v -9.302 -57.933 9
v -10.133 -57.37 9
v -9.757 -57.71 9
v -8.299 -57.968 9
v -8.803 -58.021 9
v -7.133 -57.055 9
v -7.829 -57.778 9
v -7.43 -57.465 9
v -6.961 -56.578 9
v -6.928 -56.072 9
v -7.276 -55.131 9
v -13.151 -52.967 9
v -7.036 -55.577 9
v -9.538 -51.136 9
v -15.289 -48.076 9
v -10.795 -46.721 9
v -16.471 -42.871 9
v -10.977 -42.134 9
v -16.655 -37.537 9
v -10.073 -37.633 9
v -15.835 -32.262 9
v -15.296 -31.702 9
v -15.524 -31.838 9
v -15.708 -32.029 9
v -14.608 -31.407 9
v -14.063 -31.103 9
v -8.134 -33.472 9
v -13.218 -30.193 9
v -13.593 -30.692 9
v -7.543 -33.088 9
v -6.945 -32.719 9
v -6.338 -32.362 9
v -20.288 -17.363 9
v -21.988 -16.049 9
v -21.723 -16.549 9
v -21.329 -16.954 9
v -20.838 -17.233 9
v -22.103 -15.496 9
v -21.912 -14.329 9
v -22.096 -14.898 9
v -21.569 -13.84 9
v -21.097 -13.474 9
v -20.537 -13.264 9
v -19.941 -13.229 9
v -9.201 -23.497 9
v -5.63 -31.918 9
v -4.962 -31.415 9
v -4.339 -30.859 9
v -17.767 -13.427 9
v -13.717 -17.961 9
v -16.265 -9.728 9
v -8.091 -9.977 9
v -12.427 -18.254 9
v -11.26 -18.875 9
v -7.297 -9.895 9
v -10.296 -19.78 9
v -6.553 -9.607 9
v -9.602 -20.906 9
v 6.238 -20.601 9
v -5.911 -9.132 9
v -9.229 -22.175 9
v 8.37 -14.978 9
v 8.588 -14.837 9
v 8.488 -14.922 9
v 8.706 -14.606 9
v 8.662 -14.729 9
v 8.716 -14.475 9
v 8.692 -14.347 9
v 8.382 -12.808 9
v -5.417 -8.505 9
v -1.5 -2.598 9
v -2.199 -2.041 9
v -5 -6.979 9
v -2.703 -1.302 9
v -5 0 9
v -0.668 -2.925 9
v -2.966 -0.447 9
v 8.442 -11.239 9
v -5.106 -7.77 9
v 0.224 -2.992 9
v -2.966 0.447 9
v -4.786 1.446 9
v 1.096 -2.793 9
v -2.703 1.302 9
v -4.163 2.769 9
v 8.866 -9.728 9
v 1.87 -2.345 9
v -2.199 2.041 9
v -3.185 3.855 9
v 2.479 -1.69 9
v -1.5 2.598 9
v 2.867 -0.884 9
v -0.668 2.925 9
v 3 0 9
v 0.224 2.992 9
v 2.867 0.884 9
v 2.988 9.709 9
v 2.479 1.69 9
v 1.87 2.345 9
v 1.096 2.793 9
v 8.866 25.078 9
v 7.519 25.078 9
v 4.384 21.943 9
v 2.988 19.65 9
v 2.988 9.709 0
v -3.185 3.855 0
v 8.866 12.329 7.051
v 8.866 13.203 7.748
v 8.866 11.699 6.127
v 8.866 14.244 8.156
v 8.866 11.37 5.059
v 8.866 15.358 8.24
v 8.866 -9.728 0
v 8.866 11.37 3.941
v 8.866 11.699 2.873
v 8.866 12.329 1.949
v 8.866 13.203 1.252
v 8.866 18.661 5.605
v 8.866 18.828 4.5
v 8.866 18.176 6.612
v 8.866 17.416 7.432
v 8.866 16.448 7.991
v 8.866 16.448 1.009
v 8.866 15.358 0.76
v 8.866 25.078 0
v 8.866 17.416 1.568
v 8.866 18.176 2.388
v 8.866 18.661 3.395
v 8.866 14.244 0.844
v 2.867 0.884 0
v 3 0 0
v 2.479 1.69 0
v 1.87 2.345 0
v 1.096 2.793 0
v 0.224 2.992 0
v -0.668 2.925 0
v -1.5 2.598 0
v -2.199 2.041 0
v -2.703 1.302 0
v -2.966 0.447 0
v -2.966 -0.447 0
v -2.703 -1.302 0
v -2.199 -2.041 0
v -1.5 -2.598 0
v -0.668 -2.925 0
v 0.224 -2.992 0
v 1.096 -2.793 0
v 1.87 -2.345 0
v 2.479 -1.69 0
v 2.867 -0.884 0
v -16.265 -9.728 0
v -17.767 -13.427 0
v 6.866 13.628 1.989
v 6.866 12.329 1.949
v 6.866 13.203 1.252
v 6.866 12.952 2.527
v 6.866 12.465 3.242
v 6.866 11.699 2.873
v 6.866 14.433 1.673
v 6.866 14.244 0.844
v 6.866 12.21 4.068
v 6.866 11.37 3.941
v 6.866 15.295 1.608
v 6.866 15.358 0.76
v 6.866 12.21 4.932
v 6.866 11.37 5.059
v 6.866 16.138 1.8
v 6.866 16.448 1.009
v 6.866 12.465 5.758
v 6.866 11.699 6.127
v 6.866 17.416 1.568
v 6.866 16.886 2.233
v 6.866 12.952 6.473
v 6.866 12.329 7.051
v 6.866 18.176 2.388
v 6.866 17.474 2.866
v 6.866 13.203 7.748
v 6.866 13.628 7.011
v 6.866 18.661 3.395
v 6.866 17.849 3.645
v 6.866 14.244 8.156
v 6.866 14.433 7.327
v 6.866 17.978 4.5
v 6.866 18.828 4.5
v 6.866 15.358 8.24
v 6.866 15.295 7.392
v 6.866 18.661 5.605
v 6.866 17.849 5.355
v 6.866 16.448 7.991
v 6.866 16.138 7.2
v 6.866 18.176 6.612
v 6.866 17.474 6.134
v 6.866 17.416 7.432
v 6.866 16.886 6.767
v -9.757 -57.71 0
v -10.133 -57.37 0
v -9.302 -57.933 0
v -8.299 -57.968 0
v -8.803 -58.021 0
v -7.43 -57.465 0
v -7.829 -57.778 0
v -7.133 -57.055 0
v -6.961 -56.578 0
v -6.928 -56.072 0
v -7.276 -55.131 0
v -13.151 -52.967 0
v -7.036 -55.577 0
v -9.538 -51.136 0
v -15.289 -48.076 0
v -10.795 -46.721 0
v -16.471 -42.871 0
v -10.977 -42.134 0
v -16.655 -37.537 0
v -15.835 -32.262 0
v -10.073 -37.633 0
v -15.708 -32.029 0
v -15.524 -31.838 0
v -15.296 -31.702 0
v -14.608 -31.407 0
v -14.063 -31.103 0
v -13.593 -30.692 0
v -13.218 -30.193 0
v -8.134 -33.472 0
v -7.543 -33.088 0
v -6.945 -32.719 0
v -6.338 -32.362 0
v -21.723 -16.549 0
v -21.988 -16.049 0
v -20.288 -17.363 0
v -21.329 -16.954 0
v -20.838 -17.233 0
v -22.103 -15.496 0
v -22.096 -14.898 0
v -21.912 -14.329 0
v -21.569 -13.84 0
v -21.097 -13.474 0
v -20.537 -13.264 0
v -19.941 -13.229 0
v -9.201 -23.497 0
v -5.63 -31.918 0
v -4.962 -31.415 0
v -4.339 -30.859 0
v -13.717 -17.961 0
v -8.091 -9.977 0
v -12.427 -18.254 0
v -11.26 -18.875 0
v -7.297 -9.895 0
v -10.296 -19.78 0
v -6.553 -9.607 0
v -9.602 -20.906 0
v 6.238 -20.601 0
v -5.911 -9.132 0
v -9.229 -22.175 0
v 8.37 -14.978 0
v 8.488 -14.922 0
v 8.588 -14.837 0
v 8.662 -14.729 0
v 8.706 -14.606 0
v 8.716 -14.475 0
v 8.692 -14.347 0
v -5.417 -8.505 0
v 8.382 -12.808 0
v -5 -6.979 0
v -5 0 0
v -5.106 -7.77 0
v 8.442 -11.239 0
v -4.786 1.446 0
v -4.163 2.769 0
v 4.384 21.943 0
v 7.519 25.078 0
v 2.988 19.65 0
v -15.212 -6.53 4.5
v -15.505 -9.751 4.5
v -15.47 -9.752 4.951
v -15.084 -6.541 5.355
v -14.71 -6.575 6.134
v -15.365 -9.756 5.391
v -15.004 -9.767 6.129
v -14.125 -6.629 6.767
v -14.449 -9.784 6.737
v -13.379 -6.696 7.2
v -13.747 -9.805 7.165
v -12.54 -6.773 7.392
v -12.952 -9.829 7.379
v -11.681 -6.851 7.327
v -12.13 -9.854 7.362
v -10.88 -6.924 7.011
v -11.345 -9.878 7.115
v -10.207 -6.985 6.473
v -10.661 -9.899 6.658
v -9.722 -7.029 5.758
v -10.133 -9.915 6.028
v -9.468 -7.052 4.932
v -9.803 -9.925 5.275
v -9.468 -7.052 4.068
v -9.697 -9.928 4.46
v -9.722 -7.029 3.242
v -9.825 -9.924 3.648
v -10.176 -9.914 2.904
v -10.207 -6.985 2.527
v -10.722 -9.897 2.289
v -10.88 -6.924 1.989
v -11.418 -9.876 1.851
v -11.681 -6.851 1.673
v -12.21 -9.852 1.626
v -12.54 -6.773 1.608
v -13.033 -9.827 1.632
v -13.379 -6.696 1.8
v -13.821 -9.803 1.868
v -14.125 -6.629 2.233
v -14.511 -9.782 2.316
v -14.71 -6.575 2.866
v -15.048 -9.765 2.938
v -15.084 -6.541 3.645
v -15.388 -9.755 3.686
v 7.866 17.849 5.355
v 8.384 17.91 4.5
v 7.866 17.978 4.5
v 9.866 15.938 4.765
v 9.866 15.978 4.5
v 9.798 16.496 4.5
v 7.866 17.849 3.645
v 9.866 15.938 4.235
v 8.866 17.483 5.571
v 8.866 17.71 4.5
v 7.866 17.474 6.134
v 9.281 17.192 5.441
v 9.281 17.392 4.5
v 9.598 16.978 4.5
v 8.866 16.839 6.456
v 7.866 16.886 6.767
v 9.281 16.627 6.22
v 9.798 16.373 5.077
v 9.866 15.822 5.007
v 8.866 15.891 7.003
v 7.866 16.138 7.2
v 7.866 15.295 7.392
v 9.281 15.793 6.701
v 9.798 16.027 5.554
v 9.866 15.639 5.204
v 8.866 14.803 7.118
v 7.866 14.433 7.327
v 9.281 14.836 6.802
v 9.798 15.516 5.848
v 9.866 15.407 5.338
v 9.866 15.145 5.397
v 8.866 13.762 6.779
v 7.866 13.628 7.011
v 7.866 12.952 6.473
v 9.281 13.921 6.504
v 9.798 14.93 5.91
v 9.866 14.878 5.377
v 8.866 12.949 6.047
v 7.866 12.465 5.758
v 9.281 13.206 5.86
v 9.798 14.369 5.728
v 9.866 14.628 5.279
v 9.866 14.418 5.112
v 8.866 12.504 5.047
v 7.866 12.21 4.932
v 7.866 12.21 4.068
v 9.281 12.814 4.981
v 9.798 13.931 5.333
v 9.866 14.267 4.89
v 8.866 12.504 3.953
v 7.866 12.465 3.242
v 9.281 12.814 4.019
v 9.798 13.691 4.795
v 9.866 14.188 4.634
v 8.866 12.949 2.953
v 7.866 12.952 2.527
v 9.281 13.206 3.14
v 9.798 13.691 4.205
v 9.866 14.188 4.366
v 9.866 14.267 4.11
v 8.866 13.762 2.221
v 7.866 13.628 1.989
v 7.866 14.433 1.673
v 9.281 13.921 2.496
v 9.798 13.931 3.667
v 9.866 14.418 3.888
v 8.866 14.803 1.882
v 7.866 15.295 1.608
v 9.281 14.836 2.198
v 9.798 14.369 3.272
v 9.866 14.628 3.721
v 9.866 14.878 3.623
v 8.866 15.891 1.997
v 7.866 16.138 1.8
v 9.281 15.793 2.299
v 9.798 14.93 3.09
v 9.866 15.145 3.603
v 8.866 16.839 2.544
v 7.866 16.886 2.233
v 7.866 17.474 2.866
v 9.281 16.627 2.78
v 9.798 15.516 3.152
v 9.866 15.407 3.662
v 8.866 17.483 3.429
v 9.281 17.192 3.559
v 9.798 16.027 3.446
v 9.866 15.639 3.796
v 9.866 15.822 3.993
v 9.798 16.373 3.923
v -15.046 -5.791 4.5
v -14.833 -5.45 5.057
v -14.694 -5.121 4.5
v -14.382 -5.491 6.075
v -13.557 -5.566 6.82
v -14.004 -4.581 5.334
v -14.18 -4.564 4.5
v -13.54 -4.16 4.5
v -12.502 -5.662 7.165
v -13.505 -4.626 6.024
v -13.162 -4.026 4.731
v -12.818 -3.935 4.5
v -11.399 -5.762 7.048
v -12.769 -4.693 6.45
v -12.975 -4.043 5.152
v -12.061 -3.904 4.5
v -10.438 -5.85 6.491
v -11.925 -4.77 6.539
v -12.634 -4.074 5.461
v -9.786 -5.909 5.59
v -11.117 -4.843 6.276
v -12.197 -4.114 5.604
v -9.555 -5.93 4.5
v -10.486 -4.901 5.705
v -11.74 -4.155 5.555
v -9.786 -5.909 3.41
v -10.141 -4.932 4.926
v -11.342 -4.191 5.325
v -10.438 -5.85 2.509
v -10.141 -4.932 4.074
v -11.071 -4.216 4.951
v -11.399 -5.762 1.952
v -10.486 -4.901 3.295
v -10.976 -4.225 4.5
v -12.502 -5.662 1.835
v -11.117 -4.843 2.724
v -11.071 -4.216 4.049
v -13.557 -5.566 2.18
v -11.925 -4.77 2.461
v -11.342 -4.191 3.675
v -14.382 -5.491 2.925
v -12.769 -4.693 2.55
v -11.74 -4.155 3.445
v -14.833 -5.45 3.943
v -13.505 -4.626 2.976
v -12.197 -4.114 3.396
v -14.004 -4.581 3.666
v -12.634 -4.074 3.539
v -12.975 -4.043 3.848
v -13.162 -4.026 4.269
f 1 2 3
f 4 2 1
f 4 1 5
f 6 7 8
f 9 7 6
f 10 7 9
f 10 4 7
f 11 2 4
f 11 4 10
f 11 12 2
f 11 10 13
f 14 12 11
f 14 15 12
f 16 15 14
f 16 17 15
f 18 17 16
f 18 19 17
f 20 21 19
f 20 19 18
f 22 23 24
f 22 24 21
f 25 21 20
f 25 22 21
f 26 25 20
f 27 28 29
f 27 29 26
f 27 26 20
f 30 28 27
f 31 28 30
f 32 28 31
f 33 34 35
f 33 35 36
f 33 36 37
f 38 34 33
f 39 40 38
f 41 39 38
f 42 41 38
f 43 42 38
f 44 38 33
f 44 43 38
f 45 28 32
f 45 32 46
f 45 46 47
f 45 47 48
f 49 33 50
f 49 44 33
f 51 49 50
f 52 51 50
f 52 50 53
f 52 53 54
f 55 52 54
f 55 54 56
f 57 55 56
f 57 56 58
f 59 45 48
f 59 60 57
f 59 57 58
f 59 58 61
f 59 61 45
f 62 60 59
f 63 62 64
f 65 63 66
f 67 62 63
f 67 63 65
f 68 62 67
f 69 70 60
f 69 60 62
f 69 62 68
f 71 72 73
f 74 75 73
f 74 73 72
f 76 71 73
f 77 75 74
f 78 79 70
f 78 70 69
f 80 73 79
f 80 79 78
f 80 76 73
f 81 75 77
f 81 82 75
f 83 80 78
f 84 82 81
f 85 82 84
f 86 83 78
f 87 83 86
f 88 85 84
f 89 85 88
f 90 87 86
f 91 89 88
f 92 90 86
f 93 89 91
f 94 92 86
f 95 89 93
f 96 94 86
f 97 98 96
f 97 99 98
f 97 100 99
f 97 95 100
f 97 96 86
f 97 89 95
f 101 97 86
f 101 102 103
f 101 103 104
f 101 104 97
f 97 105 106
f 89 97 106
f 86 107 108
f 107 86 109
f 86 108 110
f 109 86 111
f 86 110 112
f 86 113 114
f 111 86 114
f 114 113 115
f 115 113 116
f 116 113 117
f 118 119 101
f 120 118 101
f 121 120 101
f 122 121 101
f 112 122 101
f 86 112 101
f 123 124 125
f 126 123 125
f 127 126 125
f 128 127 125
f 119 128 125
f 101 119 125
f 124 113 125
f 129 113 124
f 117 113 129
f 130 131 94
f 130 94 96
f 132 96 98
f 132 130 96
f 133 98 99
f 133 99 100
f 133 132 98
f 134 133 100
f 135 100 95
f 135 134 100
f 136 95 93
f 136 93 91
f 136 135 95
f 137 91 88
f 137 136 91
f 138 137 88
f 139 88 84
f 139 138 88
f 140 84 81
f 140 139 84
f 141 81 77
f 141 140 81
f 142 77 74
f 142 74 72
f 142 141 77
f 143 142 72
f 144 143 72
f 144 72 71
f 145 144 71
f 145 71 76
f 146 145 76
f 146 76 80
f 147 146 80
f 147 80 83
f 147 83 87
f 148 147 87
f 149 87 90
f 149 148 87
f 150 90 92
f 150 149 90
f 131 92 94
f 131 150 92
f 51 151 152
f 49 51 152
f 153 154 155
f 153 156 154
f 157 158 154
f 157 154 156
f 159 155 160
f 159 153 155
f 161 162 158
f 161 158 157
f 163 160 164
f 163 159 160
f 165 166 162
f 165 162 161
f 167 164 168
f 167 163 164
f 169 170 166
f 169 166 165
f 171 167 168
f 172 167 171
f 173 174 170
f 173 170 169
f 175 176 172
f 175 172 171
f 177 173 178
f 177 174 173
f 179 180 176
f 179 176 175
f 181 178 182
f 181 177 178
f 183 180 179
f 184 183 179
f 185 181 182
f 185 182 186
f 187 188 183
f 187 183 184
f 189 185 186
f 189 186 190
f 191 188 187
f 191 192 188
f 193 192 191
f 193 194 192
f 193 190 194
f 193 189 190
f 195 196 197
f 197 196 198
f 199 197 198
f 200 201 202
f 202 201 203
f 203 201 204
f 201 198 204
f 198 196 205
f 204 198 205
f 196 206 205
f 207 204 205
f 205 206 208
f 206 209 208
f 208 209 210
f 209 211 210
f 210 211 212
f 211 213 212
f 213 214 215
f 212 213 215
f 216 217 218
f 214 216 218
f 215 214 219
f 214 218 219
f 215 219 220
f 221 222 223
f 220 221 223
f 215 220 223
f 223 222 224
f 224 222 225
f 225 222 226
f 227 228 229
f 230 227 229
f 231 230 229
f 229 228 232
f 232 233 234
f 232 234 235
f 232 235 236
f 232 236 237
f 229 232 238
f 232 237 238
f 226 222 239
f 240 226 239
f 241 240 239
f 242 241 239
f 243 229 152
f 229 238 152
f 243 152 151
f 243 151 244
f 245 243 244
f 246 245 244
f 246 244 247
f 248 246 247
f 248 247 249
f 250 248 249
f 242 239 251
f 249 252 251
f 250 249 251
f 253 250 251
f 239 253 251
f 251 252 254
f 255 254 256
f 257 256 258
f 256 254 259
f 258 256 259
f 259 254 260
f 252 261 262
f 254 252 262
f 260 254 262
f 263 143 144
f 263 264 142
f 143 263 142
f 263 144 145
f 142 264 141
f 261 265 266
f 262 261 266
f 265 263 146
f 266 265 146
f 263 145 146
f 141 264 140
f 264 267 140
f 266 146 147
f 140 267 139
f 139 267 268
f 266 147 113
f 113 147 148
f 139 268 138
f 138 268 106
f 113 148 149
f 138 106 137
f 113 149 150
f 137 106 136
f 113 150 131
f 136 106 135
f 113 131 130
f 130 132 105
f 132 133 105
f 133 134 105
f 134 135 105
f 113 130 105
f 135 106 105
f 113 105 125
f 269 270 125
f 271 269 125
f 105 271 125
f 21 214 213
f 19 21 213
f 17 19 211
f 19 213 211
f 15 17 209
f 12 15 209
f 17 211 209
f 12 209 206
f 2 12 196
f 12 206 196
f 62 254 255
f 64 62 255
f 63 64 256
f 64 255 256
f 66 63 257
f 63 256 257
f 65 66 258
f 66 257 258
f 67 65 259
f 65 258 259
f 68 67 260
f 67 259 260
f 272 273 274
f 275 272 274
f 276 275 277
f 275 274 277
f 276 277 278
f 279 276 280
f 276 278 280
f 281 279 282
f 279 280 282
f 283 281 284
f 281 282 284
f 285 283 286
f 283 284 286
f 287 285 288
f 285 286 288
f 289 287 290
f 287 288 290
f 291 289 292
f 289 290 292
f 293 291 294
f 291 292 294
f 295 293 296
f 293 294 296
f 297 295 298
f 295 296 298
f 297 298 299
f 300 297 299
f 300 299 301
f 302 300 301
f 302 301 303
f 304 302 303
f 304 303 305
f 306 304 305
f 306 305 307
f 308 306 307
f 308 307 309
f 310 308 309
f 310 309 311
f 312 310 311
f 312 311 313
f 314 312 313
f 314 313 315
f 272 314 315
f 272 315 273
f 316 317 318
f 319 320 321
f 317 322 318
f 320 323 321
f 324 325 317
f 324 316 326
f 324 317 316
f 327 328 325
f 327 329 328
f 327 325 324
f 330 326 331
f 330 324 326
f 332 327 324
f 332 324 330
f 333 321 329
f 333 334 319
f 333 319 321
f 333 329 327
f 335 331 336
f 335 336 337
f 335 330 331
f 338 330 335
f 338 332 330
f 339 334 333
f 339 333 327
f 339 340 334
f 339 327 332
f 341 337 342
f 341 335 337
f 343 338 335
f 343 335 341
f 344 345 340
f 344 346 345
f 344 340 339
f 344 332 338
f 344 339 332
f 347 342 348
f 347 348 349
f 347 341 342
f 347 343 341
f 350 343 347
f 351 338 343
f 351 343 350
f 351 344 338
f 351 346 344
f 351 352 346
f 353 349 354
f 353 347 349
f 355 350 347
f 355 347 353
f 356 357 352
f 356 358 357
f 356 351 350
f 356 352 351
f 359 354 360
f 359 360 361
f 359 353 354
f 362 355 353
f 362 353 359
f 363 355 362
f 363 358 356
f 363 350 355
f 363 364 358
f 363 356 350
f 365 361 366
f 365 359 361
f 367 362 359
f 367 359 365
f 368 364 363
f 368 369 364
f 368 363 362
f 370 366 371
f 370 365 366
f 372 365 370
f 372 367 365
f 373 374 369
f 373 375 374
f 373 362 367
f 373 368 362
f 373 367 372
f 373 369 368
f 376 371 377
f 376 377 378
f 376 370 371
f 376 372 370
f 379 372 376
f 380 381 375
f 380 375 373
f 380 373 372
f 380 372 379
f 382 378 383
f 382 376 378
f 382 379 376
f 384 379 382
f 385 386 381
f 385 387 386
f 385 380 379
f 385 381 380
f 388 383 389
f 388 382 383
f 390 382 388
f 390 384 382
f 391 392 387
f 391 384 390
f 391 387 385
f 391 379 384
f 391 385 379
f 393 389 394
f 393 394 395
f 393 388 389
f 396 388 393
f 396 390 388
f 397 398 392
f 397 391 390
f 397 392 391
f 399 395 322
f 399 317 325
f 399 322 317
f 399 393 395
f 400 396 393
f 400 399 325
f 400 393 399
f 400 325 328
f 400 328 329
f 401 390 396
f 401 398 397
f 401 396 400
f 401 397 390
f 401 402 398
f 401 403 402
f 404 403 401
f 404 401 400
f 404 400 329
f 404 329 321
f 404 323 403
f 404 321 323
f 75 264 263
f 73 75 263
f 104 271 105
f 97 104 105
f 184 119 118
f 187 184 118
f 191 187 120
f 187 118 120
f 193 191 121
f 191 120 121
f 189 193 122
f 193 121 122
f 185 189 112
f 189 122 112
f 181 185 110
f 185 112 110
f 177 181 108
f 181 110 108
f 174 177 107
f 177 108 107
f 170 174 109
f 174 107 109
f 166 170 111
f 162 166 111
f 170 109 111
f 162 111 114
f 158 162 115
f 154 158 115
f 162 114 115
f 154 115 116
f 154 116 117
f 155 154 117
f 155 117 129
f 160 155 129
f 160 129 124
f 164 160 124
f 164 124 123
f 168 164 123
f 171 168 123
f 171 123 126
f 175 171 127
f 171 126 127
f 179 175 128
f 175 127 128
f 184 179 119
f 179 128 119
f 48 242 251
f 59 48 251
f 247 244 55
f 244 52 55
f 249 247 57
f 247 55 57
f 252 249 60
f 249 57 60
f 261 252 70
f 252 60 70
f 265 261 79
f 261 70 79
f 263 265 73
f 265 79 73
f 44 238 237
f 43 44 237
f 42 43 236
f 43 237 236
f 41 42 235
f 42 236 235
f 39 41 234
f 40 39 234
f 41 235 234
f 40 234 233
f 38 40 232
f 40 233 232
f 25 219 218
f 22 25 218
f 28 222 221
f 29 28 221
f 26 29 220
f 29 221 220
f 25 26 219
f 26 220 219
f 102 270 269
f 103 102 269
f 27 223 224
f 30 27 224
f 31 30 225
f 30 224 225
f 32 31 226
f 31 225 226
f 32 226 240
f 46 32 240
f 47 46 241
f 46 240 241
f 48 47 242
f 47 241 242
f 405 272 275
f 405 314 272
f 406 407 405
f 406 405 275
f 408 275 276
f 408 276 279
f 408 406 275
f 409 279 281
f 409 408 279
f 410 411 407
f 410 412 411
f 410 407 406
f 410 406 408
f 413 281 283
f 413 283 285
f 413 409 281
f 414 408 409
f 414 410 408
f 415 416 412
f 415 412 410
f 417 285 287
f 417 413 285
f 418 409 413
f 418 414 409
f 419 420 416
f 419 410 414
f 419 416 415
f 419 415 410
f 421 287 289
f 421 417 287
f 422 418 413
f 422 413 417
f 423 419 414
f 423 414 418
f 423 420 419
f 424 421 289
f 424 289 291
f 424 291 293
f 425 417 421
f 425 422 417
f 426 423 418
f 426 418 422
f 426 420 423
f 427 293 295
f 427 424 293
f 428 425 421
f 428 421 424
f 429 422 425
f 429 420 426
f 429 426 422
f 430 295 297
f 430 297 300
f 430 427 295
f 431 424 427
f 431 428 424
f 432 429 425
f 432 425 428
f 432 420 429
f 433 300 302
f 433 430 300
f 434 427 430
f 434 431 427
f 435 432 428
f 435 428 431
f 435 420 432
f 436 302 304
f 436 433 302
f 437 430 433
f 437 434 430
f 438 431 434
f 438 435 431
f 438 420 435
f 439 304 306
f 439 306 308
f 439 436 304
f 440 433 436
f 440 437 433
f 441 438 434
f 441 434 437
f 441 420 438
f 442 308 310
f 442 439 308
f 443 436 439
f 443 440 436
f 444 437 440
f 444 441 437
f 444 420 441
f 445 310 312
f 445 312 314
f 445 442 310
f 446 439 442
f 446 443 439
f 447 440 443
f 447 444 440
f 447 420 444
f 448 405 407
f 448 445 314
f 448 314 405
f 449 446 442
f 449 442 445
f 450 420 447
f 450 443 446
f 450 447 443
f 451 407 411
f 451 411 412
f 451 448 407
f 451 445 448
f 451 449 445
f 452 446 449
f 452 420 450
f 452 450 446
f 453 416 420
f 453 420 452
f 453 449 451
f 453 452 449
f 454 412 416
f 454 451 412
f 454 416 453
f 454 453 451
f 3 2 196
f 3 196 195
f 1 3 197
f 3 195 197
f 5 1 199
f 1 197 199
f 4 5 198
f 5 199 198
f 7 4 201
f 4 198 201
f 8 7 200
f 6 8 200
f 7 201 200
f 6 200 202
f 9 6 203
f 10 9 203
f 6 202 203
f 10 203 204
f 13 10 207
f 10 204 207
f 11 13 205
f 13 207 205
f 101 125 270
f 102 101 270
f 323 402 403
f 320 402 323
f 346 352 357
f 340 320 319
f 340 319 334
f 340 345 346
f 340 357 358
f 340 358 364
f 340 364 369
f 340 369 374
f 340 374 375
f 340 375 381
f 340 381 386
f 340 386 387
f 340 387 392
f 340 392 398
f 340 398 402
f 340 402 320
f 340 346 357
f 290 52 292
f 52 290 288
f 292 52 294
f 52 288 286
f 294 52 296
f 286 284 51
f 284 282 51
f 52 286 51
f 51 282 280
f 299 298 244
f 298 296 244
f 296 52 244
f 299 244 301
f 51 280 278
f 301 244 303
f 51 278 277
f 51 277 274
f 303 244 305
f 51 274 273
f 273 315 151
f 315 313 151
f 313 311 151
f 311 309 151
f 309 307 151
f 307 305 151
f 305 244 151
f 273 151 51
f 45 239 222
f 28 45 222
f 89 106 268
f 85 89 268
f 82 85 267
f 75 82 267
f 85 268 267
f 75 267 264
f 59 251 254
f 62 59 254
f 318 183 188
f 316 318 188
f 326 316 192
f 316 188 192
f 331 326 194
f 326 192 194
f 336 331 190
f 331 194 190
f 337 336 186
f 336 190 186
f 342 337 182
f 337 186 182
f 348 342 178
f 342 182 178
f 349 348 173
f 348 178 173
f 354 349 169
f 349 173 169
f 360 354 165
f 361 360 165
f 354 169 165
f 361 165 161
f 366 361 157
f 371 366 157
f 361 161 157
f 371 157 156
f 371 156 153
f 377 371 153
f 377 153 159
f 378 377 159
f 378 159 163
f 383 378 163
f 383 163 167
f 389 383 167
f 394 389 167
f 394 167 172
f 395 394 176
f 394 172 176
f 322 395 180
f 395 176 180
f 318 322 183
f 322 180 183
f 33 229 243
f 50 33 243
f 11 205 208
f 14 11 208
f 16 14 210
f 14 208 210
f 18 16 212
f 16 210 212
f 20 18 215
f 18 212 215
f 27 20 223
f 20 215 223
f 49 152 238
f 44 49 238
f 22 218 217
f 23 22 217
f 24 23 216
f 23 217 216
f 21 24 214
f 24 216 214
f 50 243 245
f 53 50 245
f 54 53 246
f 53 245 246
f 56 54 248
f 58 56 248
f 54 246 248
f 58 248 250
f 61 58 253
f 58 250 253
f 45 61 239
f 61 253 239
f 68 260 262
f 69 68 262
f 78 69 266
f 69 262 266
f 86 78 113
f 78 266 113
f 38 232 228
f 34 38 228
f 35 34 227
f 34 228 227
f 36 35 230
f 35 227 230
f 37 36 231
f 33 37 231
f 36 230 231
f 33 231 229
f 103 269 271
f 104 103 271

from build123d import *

# Parameters (mm, degrees)
SKETCH_1_R          = 5
SKETCH_1_R_2        = 3
EXTRUDE_1_DEPTH     = 9
SKETCH_2_R          = 3.75
CUT_EXTRUDE_1_DEPTH = 2
SKETCH_3_R          = 2.9
EXTRUDE_2_DEPTH     = 3
FILLET_1_R          = 2
SKETCH_4_R          = 2.9
EXTRUDE_3_DEPTH     = 10
FILLET_2_R          = 2.9
FILLET_3_R          = 3


with BuildPart() as part:
    # 스케치1 → 보스-돌출1 (new body)
    # profile 1 of 5: a face of its own
    with BuildSketch(Plane.XY):
        with BuildLine():
            Line((8.866410343, 21.94338903), (4.384187039, 21.94338903))
            Line((4.384187039, 21.94338903), (2.987768149, 19.65002342))
            Line((2.987768149, 19.65002342), (2.987768149, 17.661246793))
            Line((2.987768149, 17.661246793), (2.987768149, 9.70876495))
            Line((2.987768149, 9.70876495), (-3.184671245, 3.854590647))
            ThreePointArc((-3.184671245, 3.854590647), (2.13033375, 4.523458645), (5, 0))
            ThreePointArc((5, 0), (0, -5), (-5, 0))
            Line((-5, 0), (-5, -10.071407464))
            Line((-5, -10.071407464), (-16.264805165, -9.728236855))
            Line((-16.264805165, -9.728236855), (-17.766639728, -13.42657959))
            Line((-17.766639728, -13.42657959), (-19.940502755, -13.22881584))
            ThreePointArc((-19.940502755, -13.22881584), (-21.568981751, -13.840235901), (-22.102673306, -15.49581787))
            ThreePointArc((-22.102673306, -15.49581787), (-21.54079944, -16.765444299), (-20.287735083, -17.363343312))
            Line((-20.287735083, -17.363343312), (-13.716958703, -17.9611093))
            ThreePointArc((-13.716958703, -17.9611093), (-10.295562947, -19.77999502), (-9.201017746, -23.497018692))
            Line((-9.201017746, -23.497018692), (-13.218080179, -30.193463728))
            ThreePointArc((-13.218080179, -30.193463728), (-13.817495958, -30.9099569), (-14.608237914, -31.407338947))
            Line((-14.608237914, -31.407338947), (-15.296022277, -31.702310231))
            ThreePointArc((-15.296022277, -31.702310231), (-15.622210934, -31.927735325), (-15.835150792, -32.262208238))
            ThreePointArc((-15.835150792, -32.262208238), (-16.003126851, -45.501568691), (-10.133257231, -57.36974091))
            ThreePointArc((-10.133257231, -57.36974091), (-7.618845179, -57.635707988), (-7.276099317, -55.130606848))
            ThreePointArc((-7.276099317, -55.130606848), (-11.022489697, -44.432594757), (-8.133553397, -33.471894478))
            ThreePointArc((-8.133553397, -33.471894478), (-7.245000489, -32.901805175), (-6.337557558, -32.362291125))
            ThreePointArc((-6.337557558, -32.362291125), (-5.290911527, -31.673468731), (-4.338619501, -30.85916897))
            Line((-4.338619501, -30.85916897), (6.238088337, -20.600518625))
            Line((6.238088337, -20.600518625), (8.3701186, -14.978169718))
            ThreePointArc((8.3701186, -14.978169718), (8.662275884, -14.729272874), (8.69193724, -14.346616734))
            ThreePointArc((8.69193724, -14.346616734), (8.365752146, -12.021808556), (8.866410343, -9.728236855))
            Line((8.866410343, -9.728236855), (8.866410343, 21.94338903))
        make_face()
    # profile 2 of 5: a face of its own
    with BuildSketch(Plane.XY):
        Circle(SKETCH_1_R)
        Circle(SKETCH_1_R_2, mode=Mode.SUBTRACT)
    # profile 3 of 5: a face of its own
    with BuildSketch(Plane.XY):
        with BuildLine():
            ThreePointArc((5, 0), (2.13033375, 4.523458645), (-3.184671245, 3.854590647))
            ThreePointArc((-3.184671245, 3.854590647), (-4.523458645, 2.13033375), (-5, 0))
            ThreePointArc((-5, 0), (0, -5), (5, 0))
        make_face()
        Circle(SKETCH_1_R_2, mode=Mode.SUBTRACT)
    # profile 4 of 5: a face of its own
    with BuildSketch(Plane.XY):
        Polygon((8.866410343, 25.078081763), (7.518879772, 25.078081763), (4.384187039, 21.94338903), (8.866410343, 21.94338903), align=None)
    # profile 5 of 5: a face of its own
    with BuildSketch(Plane.XY):
        with BuildLine():
            Line((8.866410343, 21.94338903), (4.384187039, 21.94338903))
            Line((4.384187039, 21.94338903), (2.987768149, 19.65002342))
            Line((2.987768149, 19.65002342), (2.987768149, 17.661246793))
            Line((2.987768149, 17.661246793), (2.987768149, 9.70876495))
            Line((2.987768149, 9.70876495), (-3.184671245, 3.854590647))
            ThreePointArc((-3.184671245, 3.854590647), (2.13033375, 4.523458645), (5, 0))
            ThreePointArc((5, 0), (0, -5), (-5, 0))
            Line((-5, 0), (-5, -10.071407464))
            Line((-5, -10.071407464), (-16.264805165, -9.728236855))
            Line((-16.264805165, -9.728236855), (-17.766639728, -13.42657959))
            Line((-17.766639728, -13.42657959), (-19.940502755, -13.22881584))
            ThreePointArc((-19.940502755, -13.22881584), (-21.568981751, -13.840235901), (-22.102673306, -15.49581787))
            ThreePointArc((-22.102673306, -15.49581787), (-21.54079944, -16.765444299), (-20.287735083, -17.363343312))
            Line((-20.287735083, -17.363343312), (-13.716958703, -17.9611093))
            ThreePointArc((-13.716958703, -17.9611093), (-10.295562947, -19.77999502), (-9.201017746, -23.497018692))
            Line((-9.201017746, -23.497018692), (-13.218080179, -30.193463728))
            ThreePointArc((-13.218080179, -30.193463728), (-13.817495958, -30.9099569), (-14.608237914, -31.407338947))
            Line((-14.608237914, -31.407338947), (-15.296022277, -31.702310231))
            ThreePointArc((-15.296022277, -31.702310231), (-15.622210934, -31.927735325), (-15.835150792, -32.262208238))
            ThreePointArc((-15.835150792, -32.262208238), (-16.003126851, -45.501568691), (-10.133257231, -57.36974091))
            ThreePointArc((-10.133257231, -57.36974091), (-7.618845179, -57.635707988), (-7.276099317, -55.130606848))
            ThreePointArc((-7.276099317, -55.130606848), (-11.022489697, -44.432594757), (-8.133553397, -33.471894478))
            ThreePointArc((-8.133553397, -33.471894478), (-7.245000489, -32.901805175), (-6.337557558, -32.362291125))
            ThreePointArc((-6.337557558, -32.362291125), (-5.290911527, -31.673468731), (-4.338619501, -30.85916897))
            Line((-4.338619501, -30.85916897), (6.238088337, -20.600518625))
            Line((6.238088337, -20.600518625), (8.3701186, -14.978169718))
            ThreePointArc((8.3701186, -14.978169718), (8.662275884, -14.729272874), (8.69193724, -14.346616734))
            ThreePointArc((8.69193724, -14.346616734), (8.365752146, -12.021808556), (8.866410343, -9.728236855))
            Line((8.866410343, -9.728236855), (8.866410343, 21.94338903))
        make_face()
    extrude(amount=EXTRUDE_1_DEPTH)

    # 스케치2 → 컷-돌출1 (cut)
    with BuildSketch(Plane(origin=(8.866410343, 0, 0), x_dir=(0, 0, -1), z_dir=(1, 0, 0))):
        with Locations(Location((-4.5, 15.078081763, 0), (0, 0, 90))):
            Circle(SKETCH_2_R)
    extrude(amount=-CUT_EXTRUDE_1_DEPTH, mode=Mode.SUBTRACT)

    # 스케치3 → 보스-돌출2 (add)
    with BuildSketch(Plane(origin=(6.866410343, 0, 0), x_dir=(0, 0, -1), z_dir=(1, 0, 0))):
        with Locations(Location((-4.5, 15.078081763, 0), (0, 0, 90))):
            Circle(SKETCH_3_R)
    extrude(amount=EXTRUDE_2_DEPTH)

    # 필렛1
    fillet_1_edges = [part.edges().sort_by_distance(p)[0] for p in [
        (9.866410343, 12.178081763, 4.5),
    ]]
    fillet(fillet_1_edges, radius=FILLET_1_R)

    # 스케치4 → 보스-돌출3 (add)
    with BuildSketch(Plane(origin=(-1.357268469, -14.919396185, 0), x_dir=(0.995887428286197, -0.09059928355955607, 0), z_dir=(0.09059928355955607, 0.995887428286197, 0))):
        with Locations(Location((-11.65777439, -4.5, 0), (0, 0, 180))):
            Circle(SKETCH_4_R)
    extrude(amount=EXTRUDE_3_DEPTH)

    # 필렛2
    fillet_2_edges = [part.edges().sort_by_distance(p)[0] for p in [
        (-9.173033049, -4.167073817, 4.5),
    ]]
    fillet(fillet_2_edges, radius=FILLET_2_R)

    # 필렛3
    fillet_3_edges = [part.edges().sort_by_distance(p)[0] for p in [
        (-5, -10.071407464, 4.5),
    ]]
    fillet(fillet_3_edges, radius=FILLET_3_R)


solid = part.part
